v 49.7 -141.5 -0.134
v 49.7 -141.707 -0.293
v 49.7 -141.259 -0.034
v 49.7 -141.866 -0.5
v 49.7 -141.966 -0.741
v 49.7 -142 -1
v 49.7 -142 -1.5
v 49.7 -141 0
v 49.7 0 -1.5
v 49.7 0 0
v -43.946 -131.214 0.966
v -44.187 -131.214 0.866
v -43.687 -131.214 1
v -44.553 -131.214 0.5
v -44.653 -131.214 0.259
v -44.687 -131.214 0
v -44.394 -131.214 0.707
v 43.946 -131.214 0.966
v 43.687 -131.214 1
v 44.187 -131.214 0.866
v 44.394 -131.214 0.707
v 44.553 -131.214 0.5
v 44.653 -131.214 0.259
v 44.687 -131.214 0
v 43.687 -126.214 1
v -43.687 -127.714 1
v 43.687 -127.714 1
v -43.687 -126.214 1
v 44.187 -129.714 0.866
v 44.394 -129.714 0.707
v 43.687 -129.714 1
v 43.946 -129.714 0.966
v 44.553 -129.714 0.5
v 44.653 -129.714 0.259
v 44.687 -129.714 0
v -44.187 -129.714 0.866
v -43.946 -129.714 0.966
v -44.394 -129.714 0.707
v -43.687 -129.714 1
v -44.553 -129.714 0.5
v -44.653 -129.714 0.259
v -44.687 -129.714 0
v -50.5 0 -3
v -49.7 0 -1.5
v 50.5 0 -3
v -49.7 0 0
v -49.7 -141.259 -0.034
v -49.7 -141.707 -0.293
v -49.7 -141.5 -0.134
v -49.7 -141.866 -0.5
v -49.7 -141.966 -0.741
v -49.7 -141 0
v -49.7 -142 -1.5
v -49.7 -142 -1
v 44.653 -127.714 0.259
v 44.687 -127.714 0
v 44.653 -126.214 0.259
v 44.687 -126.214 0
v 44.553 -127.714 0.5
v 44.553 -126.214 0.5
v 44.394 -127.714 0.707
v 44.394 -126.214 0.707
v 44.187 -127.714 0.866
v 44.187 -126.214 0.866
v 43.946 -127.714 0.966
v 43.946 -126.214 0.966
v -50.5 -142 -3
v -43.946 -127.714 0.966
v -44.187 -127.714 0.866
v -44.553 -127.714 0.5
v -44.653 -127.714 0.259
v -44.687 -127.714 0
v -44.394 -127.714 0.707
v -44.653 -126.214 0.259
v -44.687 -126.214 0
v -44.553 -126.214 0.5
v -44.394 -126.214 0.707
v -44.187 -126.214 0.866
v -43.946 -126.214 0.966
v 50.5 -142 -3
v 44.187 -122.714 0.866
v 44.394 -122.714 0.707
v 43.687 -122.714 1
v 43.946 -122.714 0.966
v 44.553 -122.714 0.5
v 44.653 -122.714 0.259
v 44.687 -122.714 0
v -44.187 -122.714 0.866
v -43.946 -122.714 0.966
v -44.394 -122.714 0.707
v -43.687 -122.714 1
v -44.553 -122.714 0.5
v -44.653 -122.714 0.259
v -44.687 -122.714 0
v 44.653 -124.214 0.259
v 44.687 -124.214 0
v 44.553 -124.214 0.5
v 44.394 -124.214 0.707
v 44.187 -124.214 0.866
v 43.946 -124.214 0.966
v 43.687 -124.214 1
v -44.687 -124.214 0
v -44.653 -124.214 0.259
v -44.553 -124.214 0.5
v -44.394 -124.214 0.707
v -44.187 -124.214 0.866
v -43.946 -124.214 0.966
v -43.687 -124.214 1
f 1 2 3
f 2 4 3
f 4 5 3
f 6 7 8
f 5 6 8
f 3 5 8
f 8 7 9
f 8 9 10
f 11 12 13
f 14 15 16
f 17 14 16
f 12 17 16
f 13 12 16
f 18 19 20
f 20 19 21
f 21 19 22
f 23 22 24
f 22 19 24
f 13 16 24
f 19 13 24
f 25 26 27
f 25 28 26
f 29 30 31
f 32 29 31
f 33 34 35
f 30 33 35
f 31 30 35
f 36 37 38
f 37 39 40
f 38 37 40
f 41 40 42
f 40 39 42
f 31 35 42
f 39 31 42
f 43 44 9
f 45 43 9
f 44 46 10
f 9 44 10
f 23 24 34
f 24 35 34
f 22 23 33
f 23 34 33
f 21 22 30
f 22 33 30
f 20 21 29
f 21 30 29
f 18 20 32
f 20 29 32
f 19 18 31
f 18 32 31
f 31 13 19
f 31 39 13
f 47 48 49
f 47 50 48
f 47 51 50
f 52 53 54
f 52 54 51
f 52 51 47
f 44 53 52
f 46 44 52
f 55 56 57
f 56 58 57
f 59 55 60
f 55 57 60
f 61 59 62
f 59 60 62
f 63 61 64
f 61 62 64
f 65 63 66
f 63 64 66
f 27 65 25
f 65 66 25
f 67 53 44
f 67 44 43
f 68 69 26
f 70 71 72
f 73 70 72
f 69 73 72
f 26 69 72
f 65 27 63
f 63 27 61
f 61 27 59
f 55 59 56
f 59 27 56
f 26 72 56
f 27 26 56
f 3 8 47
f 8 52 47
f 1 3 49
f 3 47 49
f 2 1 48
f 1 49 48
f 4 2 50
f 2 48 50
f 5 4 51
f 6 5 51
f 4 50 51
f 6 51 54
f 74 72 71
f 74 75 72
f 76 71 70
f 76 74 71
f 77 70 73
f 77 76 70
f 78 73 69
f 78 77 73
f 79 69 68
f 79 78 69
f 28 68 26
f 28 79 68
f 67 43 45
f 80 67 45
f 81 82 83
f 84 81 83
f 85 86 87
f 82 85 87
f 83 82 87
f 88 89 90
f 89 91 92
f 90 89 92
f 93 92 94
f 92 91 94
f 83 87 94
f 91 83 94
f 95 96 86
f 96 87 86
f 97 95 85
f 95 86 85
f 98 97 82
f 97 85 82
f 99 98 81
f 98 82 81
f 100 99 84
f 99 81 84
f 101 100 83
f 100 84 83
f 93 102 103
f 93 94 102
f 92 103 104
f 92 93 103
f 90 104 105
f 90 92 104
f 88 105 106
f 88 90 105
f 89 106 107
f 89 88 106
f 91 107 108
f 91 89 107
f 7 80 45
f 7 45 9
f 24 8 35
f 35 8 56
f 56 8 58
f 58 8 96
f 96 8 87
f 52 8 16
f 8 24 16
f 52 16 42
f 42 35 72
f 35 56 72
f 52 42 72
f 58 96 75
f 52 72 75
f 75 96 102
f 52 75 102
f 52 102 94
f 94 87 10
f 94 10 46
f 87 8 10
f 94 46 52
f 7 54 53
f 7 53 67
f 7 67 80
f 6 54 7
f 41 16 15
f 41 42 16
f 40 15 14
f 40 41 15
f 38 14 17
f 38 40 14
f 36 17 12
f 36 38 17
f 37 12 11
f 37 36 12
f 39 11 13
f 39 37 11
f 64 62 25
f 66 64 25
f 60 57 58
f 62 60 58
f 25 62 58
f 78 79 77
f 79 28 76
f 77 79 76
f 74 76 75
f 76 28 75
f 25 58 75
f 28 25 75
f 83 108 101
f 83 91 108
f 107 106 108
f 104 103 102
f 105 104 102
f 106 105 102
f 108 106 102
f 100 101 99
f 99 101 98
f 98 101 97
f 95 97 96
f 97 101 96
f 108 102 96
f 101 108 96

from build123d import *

# Parameters (mm, degrees)
F0_W     = 49.7
F0_H     = 1.5
F1_DEPTH = 142
F2_W     = 44.6868650615
F2_H     = 1.5
F3_DEPTH = 1
F4_R     = 0.99999


# Not quite as in the source:
# - a fillet or chamfer is up to 0.001 mm smaller than in the source, because OpenCascade refuses the exact size


with BuildPart() as f1:
    # F0 (on Front) → F1 (new body)
    with BuildSketch(Plane.XZ):
        with Locations((24.85, -0.75)):
            Rectangle(F0_W, F0_H)
        with Locations((-24.85, -0.75)):
            Rectangle(F0_W, F0_H)
        Polygon((49.7, -1.5), (0, -1.5), (0, -3), (50.5, -3), align=None)
        Polygon((0, -3), (0, -1.5), (-49.7, -1.5), (-50.5, -3), align=None)
    extrude(amount=F1_DEPTH)

    # F2 (on face) → F3 (join)
    with BuildSketch(Plane.XY):
        with Locations((-22.3434325308, -130.4639992552)):
            Rectangle(F2_W, F2_H)
        with Locations((22.3434325308, -130.4639992552)):
            Rectangle(F2_W, F2_H)
        with Locations((-22.3434325308, -126.9639992552)):
            Rectangle(F2_W, F2_H)
        with Locations((22.3434325308, -126.9639992552)):
            Rectangle(F2_W, F2_H)
        with Locations((-22.3434325308, -123.4639992552)):
            Rectangle(F2_W, F2_H)
        with Locations((22.3434325308, -123.4639992552)):
            Rectangle(F2_W, F2_H)
    extrude(amount=F3_DEPTH)

    # F4 (radius 1 in the source; OpenCascade refuses exactly that, so slightly less here)
    f4_edges = [f1.edges().sort_by_distance(p)[0] for p in [
        (-44.686865, -123.463999, 1),
        (-44.686865, -126.963999, 1),
        (-44.686865, -130.463999, 1),
        (44.686865, -123.463999, 1),
        (44.686865, -126.963999, 1),
        (44.686865, -130.463999, 1),
        (0, -142, 0),
    ]]
    fillet(f4_edges, radius=F4_R)


solid = f1.part
